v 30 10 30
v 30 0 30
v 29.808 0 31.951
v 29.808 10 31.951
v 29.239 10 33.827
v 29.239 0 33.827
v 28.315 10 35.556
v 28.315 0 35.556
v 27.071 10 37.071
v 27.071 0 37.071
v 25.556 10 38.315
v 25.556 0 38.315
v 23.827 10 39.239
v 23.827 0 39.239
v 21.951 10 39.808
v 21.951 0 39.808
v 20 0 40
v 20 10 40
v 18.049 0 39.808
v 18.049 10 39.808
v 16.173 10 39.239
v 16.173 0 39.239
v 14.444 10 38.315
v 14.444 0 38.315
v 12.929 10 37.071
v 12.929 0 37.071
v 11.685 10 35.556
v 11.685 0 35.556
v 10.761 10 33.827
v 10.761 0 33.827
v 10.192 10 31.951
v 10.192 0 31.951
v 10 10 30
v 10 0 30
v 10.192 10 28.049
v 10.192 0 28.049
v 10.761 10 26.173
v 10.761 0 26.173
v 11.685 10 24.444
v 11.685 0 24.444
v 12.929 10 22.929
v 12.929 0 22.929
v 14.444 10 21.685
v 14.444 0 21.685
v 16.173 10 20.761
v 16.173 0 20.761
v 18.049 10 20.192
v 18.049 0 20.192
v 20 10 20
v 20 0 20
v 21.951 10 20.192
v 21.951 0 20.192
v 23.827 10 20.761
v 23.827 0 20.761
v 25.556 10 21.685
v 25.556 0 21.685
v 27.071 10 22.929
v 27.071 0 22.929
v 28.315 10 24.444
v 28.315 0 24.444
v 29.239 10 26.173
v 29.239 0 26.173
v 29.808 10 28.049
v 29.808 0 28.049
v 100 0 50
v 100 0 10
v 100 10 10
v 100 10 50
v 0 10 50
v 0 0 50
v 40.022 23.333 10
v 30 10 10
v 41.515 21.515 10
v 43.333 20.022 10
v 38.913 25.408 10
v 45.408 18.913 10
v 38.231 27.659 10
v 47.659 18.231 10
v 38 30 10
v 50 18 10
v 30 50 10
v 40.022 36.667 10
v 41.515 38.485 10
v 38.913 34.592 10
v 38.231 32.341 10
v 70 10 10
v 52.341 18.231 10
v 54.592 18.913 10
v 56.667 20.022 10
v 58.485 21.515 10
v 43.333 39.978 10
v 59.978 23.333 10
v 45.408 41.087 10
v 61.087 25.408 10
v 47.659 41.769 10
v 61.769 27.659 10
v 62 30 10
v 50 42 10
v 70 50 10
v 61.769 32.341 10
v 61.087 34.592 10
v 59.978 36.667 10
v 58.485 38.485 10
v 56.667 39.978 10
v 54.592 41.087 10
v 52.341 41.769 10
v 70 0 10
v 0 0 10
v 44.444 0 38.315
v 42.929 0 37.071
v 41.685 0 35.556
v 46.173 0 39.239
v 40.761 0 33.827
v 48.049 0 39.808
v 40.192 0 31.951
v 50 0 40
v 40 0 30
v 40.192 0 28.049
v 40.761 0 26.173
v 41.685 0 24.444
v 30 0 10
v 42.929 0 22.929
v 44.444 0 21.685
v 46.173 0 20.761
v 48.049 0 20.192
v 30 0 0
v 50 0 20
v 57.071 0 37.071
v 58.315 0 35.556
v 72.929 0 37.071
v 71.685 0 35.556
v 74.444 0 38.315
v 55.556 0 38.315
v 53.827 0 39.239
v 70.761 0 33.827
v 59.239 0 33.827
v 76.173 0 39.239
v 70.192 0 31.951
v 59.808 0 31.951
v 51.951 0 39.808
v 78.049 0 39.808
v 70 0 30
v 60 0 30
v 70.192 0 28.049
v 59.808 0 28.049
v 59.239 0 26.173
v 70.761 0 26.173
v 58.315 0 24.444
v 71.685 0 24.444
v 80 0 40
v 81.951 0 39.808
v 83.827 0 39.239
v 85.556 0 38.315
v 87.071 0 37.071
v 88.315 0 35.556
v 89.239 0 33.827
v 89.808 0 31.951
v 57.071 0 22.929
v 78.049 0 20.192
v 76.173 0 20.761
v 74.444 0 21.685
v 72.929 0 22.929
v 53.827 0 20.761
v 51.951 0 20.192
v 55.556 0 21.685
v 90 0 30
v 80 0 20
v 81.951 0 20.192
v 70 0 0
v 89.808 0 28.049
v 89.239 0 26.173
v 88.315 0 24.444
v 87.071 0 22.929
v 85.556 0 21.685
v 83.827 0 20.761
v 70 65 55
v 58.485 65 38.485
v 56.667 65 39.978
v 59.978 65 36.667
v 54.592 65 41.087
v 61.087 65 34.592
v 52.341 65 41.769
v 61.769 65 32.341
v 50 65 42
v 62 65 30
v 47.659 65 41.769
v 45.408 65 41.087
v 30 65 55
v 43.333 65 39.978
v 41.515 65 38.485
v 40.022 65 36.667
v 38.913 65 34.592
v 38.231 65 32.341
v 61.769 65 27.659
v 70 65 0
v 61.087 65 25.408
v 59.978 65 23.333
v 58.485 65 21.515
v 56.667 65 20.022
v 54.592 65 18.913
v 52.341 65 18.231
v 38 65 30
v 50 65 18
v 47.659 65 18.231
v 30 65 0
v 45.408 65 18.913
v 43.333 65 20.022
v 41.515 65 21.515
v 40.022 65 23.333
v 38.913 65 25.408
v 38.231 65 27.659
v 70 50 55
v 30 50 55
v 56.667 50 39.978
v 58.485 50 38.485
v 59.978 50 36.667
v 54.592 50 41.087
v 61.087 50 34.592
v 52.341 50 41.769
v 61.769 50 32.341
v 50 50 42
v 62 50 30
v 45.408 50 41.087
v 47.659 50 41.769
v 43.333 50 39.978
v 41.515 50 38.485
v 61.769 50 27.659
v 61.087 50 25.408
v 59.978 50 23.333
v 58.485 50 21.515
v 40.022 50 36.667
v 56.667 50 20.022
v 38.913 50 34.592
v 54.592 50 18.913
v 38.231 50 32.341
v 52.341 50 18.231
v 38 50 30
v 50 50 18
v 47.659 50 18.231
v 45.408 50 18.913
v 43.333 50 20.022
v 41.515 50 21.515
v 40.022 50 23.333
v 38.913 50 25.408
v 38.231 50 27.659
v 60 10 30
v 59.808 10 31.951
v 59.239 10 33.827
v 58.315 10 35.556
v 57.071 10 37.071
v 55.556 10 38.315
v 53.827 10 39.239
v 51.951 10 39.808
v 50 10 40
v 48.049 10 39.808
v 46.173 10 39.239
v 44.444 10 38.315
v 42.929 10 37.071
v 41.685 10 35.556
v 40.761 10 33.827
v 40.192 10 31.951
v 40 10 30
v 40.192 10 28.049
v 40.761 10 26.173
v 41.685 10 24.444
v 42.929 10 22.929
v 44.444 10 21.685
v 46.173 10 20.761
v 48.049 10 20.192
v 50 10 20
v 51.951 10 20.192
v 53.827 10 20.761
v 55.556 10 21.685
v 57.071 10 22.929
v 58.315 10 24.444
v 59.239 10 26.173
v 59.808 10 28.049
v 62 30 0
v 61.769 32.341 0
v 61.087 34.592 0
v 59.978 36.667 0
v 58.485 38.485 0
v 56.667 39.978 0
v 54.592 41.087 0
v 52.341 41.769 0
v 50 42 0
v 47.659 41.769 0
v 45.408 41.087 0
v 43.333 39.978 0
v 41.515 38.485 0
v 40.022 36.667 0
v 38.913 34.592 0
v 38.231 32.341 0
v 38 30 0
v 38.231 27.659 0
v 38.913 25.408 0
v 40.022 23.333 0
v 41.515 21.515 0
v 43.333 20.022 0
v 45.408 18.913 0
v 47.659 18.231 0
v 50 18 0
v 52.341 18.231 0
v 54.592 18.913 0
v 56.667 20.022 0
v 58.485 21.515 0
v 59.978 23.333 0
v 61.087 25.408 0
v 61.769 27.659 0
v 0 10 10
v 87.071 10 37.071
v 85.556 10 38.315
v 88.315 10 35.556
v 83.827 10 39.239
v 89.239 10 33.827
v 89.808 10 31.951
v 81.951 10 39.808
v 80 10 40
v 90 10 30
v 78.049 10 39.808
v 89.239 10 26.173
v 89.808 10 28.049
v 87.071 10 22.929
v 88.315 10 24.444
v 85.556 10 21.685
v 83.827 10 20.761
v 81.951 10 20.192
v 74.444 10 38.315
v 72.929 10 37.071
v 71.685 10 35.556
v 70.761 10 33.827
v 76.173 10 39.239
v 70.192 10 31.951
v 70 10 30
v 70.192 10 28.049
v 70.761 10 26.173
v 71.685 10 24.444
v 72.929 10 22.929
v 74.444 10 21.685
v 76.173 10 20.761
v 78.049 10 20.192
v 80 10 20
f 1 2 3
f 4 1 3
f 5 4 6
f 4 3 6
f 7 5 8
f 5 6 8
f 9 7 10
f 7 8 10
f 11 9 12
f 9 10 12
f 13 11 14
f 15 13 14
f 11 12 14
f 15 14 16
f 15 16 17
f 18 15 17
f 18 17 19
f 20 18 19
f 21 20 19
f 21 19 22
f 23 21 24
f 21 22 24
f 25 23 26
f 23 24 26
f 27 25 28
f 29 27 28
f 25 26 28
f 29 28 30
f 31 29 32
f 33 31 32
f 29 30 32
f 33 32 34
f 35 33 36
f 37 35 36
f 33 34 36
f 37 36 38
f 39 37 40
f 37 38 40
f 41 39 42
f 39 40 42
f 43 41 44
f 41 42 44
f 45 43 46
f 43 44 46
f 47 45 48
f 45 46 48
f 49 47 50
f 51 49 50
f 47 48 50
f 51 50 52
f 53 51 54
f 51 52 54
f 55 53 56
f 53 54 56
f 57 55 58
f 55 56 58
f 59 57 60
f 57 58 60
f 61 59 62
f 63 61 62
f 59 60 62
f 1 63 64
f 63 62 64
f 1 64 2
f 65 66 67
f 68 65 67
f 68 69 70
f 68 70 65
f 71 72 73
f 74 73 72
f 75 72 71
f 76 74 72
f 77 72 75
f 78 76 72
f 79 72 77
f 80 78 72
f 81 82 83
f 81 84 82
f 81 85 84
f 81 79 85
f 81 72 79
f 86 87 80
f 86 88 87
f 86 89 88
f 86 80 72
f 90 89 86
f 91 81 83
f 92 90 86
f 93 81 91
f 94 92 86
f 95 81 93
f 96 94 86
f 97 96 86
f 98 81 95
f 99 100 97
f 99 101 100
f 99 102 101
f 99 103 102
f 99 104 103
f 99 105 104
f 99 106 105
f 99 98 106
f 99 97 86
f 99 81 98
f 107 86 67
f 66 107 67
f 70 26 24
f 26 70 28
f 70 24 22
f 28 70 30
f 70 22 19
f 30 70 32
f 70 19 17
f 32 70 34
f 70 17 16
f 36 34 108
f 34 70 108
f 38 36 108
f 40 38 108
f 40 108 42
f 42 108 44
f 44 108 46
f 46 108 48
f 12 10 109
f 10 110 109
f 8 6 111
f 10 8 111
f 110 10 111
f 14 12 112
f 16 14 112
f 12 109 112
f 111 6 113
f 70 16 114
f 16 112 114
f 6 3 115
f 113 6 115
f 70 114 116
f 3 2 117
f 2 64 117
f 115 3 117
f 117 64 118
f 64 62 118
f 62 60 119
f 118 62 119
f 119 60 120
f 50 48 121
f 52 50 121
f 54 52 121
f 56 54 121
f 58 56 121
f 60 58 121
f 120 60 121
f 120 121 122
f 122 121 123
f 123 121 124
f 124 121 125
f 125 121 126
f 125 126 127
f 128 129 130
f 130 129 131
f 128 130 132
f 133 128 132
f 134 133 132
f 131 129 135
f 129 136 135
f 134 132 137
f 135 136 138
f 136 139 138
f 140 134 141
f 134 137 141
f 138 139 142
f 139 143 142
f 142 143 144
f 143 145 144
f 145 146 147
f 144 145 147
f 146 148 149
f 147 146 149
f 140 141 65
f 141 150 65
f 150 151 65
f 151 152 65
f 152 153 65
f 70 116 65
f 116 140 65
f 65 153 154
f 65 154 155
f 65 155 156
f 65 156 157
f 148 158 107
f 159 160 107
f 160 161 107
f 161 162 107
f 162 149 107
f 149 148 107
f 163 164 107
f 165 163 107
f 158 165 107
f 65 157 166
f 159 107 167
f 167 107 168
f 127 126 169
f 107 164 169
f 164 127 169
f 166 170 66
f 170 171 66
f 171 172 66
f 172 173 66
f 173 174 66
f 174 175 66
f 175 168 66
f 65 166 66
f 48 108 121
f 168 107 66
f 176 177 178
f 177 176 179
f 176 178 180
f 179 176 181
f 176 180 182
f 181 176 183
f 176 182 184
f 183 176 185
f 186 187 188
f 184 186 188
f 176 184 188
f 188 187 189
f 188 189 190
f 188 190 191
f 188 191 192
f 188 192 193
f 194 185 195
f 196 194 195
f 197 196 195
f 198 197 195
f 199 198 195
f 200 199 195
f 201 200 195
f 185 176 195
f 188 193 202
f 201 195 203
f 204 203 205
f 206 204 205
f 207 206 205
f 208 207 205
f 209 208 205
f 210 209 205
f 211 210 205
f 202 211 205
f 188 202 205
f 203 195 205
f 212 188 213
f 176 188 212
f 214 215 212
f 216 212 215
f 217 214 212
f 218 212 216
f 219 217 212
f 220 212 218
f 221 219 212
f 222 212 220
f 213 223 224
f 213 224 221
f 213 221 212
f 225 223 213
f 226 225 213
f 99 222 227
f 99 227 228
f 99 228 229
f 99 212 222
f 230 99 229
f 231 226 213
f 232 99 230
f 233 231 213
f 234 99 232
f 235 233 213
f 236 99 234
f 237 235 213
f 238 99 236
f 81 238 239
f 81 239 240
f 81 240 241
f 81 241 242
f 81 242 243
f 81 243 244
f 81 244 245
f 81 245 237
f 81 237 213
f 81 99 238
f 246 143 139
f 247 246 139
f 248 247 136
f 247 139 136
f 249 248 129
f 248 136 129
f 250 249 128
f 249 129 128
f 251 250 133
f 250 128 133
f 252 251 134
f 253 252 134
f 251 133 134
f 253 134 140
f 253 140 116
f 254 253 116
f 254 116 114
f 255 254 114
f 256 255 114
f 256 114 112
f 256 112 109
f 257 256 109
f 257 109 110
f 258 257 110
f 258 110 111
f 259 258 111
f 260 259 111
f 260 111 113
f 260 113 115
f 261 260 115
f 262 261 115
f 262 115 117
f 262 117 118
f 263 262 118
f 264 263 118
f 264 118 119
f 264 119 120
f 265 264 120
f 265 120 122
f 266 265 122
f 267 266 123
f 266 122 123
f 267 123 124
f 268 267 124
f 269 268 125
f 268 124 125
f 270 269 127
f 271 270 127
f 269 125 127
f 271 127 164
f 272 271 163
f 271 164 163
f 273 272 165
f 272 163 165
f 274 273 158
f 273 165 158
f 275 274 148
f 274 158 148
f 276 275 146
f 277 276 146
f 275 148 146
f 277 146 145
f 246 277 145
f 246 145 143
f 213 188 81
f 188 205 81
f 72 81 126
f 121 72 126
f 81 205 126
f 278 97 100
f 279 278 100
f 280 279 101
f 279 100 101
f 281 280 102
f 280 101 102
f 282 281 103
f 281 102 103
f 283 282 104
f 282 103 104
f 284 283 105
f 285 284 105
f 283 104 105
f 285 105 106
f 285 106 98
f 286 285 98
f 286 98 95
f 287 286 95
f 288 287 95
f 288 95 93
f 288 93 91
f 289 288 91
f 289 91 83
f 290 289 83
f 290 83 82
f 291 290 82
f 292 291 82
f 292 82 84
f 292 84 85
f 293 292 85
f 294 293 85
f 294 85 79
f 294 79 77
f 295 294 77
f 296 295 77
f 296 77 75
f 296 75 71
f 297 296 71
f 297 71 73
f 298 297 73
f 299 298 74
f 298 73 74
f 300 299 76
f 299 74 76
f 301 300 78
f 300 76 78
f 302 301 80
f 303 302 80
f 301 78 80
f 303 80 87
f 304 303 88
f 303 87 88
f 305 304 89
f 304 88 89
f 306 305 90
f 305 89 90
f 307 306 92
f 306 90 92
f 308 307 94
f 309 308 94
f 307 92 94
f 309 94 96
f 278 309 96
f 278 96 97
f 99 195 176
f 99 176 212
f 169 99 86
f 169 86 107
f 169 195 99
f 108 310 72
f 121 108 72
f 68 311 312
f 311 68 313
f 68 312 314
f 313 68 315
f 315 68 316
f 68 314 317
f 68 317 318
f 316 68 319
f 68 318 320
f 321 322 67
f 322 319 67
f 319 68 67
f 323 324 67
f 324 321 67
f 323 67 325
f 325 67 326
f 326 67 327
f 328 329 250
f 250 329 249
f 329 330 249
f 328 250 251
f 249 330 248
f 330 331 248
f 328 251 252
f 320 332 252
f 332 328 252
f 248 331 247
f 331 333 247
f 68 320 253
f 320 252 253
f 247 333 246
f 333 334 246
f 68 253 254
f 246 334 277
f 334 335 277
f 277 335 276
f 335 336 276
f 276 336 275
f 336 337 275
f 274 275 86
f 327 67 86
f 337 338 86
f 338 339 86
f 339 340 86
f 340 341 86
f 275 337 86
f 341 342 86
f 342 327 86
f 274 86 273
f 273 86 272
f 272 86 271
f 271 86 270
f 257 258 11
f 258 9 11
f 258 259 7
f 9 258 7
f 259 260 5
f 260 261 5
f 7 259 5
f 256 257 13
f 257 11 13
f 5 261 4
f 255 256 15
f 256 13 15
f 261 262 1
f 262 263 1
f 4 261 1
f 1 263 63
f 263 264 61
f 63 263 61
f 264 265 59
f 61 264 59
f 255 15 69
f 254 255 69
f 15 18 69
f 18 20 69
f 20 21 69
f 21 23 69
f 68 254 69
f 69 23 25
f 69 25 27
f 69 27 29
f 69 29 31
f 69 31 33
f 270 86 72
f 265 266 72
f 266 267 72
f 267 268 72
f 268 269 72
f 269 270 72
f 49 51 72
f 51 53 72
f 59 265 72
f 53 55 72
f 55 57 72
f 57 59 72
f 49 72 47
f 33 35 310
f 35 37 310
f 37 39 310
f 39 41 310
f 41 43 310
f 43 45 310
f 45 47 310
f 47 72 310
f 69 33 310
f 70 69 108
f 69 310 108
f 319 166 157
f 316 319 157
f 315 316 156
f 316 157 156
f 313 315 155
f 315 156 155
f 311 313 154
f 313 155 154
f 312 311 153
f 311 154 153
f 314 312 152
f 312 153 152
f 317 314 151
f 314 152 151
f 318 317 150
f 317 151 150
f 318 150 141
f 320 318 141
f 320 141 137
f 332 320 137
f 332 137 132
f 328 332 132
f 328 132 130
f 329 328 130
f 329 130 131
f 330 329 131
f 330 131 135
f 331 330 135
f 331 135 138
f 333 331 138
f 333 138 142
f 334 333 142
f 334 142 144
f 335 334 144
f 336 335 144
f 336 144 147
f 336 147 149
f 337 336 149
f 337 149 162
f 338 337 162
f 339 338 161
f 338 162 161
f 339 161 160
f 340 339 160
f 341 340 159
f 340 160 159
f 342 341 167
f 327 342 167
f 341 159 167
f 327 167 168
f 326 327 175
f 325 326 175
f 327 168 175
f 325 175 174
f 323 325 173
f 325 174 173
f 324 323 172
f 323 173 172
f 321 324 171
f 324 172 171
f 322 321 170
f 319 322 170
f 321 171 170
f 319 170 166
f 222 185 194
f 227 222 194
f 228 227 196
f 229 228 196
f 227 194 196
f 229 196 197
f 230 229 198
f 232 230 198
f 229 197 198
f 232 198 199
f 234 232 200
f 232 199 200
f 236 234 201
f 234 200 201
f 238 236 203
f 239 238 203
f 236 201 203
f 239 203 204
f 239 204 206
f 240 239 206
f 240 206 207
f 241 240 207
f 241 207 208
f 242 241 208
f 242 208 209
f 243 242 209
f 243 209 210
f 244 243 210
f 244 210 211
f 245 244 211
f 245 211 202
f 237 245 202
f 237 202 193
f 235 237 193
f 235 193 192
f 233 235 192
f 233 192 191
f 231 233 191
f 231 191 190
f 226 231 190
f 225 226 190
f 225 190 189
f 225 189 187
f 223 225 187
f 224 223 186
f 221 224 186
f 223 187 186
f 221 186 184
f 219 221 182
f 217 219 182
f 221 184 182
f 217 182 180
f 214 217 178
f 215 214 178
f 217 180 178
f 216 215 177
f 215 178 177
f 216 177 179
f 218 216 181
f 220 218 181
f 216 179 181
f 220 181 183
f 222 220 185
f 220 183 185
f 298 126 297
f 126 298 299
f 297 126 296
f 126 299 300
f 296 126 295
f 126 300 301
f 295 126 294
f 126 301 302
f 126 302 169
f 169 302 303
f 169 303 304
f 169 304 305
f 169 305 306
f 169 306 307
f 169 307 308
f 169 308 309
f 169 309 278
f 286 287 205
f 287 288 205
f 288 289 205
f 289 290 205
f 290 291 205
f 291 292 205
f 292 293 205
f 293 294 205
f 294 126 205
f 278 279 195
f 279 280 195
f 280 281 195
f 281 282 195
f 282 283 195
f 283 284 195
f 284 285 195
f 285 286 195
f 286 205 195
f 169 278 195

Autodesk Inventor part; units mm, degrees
ref_plane "YZ Plane" through (0, 0, 0) normal (1, 0, 0) x (0, 1, 0)
ref_plane "XZ Plane" through (0, 0, 0) normal (0, 1, 0) x (-1, 0, 0)
ref_plane "XY Plane" through (0, 0, 0) normal (0, 0, 1) x (1, 0, 0)
sketch "Sketch1" plane through (0, 0, 0) normal (0, 0, 1) x (1, 0, 0)
  line L0 (0, 0) -> (100, 0)
  line L1 (100, 0) -> (100, 10)
  line L2 (70, 65) -> (30, 65)
  line L3 (0, 10) -> (0, 0)
  line L4 (0, 10) -> (100, 10)
  line L5 (30, 65) -> (30, 0)
  line L6 (70, 65) -> (70, 0)
  dimension "d0" = 100
  dimension "d1" = 10
extrude "Extrusion1" add sketch "Sketch1" along normal blind 10 contours L5 L4 L6 L0 | L5 L2 L6 L4
sketch "Sketch2" plane through (0, 0, 10) normal (0, 0, 1) x (1, 0, 0)
  line L0 (0, 0) -> (100, 0)
  line L1 (100, 0) -> (100, 10)
  line L2 (100, 10) -> (0, 10)
  line L3 (0, 10) -> (0, 0)
extrude "Extrusion2" add sketch "Sketch2" along normal blind 40
sketch "Sketch3" plane through (0, 0, 10) normal (0, 0, 1) x (1, 0, 0)
  line L0 (70, 65) -> (30, 65) projected
  line L1 (30, 65) -> (70, 65)
  line L2 (70, 65) -> (70, 50)
  line L3 (70, 0) -> (70, 65) projected
  line L4 (70, 50) -> (30, 50)
  line L5 (30, 65) -> (30, 0) projected
  line L6 (30, 50) -> (30, 65)
  point P0 (0, 0)
extrude "Extrusion3" add sketch "Sketch3" along normal blind 45
sketch "Sketch4" plane through (30, 65, 0) normal (0, 1, 0) x (1, 0, 0)
  circle A0 centre (20, -30) radius 12
  point P0 (-30, 0)
extrude "Extrusion4" cut sketch "Sketch4" against normal blind 15
sketch "Sketch5" plane through (0, 0, 10) normal (0, 0, 1) x (1, 0, 0)
  circle A0 centre (50, 30) radius 12
  point P0 (0, 0)
extrude "Extrusion5" cut sketch "Sketch5" against normal blind 10
sketch "Sketch6" plane through (30, 0, 0) normal (0, -1, 0) x (1, 0, 0)
  circle A0 centre (-10, 30) radius 10
  circle A1 centre (20, 30) radius 10
  circle A2 centre (50, 30) radius 10
  line L0 (40, 10) -> (40, 55) projected
  point P0 (-30, 0)
extrude "Extrusion6" cut sketch "Sketch6" against normal blind 10
properties part number "P3-9"
